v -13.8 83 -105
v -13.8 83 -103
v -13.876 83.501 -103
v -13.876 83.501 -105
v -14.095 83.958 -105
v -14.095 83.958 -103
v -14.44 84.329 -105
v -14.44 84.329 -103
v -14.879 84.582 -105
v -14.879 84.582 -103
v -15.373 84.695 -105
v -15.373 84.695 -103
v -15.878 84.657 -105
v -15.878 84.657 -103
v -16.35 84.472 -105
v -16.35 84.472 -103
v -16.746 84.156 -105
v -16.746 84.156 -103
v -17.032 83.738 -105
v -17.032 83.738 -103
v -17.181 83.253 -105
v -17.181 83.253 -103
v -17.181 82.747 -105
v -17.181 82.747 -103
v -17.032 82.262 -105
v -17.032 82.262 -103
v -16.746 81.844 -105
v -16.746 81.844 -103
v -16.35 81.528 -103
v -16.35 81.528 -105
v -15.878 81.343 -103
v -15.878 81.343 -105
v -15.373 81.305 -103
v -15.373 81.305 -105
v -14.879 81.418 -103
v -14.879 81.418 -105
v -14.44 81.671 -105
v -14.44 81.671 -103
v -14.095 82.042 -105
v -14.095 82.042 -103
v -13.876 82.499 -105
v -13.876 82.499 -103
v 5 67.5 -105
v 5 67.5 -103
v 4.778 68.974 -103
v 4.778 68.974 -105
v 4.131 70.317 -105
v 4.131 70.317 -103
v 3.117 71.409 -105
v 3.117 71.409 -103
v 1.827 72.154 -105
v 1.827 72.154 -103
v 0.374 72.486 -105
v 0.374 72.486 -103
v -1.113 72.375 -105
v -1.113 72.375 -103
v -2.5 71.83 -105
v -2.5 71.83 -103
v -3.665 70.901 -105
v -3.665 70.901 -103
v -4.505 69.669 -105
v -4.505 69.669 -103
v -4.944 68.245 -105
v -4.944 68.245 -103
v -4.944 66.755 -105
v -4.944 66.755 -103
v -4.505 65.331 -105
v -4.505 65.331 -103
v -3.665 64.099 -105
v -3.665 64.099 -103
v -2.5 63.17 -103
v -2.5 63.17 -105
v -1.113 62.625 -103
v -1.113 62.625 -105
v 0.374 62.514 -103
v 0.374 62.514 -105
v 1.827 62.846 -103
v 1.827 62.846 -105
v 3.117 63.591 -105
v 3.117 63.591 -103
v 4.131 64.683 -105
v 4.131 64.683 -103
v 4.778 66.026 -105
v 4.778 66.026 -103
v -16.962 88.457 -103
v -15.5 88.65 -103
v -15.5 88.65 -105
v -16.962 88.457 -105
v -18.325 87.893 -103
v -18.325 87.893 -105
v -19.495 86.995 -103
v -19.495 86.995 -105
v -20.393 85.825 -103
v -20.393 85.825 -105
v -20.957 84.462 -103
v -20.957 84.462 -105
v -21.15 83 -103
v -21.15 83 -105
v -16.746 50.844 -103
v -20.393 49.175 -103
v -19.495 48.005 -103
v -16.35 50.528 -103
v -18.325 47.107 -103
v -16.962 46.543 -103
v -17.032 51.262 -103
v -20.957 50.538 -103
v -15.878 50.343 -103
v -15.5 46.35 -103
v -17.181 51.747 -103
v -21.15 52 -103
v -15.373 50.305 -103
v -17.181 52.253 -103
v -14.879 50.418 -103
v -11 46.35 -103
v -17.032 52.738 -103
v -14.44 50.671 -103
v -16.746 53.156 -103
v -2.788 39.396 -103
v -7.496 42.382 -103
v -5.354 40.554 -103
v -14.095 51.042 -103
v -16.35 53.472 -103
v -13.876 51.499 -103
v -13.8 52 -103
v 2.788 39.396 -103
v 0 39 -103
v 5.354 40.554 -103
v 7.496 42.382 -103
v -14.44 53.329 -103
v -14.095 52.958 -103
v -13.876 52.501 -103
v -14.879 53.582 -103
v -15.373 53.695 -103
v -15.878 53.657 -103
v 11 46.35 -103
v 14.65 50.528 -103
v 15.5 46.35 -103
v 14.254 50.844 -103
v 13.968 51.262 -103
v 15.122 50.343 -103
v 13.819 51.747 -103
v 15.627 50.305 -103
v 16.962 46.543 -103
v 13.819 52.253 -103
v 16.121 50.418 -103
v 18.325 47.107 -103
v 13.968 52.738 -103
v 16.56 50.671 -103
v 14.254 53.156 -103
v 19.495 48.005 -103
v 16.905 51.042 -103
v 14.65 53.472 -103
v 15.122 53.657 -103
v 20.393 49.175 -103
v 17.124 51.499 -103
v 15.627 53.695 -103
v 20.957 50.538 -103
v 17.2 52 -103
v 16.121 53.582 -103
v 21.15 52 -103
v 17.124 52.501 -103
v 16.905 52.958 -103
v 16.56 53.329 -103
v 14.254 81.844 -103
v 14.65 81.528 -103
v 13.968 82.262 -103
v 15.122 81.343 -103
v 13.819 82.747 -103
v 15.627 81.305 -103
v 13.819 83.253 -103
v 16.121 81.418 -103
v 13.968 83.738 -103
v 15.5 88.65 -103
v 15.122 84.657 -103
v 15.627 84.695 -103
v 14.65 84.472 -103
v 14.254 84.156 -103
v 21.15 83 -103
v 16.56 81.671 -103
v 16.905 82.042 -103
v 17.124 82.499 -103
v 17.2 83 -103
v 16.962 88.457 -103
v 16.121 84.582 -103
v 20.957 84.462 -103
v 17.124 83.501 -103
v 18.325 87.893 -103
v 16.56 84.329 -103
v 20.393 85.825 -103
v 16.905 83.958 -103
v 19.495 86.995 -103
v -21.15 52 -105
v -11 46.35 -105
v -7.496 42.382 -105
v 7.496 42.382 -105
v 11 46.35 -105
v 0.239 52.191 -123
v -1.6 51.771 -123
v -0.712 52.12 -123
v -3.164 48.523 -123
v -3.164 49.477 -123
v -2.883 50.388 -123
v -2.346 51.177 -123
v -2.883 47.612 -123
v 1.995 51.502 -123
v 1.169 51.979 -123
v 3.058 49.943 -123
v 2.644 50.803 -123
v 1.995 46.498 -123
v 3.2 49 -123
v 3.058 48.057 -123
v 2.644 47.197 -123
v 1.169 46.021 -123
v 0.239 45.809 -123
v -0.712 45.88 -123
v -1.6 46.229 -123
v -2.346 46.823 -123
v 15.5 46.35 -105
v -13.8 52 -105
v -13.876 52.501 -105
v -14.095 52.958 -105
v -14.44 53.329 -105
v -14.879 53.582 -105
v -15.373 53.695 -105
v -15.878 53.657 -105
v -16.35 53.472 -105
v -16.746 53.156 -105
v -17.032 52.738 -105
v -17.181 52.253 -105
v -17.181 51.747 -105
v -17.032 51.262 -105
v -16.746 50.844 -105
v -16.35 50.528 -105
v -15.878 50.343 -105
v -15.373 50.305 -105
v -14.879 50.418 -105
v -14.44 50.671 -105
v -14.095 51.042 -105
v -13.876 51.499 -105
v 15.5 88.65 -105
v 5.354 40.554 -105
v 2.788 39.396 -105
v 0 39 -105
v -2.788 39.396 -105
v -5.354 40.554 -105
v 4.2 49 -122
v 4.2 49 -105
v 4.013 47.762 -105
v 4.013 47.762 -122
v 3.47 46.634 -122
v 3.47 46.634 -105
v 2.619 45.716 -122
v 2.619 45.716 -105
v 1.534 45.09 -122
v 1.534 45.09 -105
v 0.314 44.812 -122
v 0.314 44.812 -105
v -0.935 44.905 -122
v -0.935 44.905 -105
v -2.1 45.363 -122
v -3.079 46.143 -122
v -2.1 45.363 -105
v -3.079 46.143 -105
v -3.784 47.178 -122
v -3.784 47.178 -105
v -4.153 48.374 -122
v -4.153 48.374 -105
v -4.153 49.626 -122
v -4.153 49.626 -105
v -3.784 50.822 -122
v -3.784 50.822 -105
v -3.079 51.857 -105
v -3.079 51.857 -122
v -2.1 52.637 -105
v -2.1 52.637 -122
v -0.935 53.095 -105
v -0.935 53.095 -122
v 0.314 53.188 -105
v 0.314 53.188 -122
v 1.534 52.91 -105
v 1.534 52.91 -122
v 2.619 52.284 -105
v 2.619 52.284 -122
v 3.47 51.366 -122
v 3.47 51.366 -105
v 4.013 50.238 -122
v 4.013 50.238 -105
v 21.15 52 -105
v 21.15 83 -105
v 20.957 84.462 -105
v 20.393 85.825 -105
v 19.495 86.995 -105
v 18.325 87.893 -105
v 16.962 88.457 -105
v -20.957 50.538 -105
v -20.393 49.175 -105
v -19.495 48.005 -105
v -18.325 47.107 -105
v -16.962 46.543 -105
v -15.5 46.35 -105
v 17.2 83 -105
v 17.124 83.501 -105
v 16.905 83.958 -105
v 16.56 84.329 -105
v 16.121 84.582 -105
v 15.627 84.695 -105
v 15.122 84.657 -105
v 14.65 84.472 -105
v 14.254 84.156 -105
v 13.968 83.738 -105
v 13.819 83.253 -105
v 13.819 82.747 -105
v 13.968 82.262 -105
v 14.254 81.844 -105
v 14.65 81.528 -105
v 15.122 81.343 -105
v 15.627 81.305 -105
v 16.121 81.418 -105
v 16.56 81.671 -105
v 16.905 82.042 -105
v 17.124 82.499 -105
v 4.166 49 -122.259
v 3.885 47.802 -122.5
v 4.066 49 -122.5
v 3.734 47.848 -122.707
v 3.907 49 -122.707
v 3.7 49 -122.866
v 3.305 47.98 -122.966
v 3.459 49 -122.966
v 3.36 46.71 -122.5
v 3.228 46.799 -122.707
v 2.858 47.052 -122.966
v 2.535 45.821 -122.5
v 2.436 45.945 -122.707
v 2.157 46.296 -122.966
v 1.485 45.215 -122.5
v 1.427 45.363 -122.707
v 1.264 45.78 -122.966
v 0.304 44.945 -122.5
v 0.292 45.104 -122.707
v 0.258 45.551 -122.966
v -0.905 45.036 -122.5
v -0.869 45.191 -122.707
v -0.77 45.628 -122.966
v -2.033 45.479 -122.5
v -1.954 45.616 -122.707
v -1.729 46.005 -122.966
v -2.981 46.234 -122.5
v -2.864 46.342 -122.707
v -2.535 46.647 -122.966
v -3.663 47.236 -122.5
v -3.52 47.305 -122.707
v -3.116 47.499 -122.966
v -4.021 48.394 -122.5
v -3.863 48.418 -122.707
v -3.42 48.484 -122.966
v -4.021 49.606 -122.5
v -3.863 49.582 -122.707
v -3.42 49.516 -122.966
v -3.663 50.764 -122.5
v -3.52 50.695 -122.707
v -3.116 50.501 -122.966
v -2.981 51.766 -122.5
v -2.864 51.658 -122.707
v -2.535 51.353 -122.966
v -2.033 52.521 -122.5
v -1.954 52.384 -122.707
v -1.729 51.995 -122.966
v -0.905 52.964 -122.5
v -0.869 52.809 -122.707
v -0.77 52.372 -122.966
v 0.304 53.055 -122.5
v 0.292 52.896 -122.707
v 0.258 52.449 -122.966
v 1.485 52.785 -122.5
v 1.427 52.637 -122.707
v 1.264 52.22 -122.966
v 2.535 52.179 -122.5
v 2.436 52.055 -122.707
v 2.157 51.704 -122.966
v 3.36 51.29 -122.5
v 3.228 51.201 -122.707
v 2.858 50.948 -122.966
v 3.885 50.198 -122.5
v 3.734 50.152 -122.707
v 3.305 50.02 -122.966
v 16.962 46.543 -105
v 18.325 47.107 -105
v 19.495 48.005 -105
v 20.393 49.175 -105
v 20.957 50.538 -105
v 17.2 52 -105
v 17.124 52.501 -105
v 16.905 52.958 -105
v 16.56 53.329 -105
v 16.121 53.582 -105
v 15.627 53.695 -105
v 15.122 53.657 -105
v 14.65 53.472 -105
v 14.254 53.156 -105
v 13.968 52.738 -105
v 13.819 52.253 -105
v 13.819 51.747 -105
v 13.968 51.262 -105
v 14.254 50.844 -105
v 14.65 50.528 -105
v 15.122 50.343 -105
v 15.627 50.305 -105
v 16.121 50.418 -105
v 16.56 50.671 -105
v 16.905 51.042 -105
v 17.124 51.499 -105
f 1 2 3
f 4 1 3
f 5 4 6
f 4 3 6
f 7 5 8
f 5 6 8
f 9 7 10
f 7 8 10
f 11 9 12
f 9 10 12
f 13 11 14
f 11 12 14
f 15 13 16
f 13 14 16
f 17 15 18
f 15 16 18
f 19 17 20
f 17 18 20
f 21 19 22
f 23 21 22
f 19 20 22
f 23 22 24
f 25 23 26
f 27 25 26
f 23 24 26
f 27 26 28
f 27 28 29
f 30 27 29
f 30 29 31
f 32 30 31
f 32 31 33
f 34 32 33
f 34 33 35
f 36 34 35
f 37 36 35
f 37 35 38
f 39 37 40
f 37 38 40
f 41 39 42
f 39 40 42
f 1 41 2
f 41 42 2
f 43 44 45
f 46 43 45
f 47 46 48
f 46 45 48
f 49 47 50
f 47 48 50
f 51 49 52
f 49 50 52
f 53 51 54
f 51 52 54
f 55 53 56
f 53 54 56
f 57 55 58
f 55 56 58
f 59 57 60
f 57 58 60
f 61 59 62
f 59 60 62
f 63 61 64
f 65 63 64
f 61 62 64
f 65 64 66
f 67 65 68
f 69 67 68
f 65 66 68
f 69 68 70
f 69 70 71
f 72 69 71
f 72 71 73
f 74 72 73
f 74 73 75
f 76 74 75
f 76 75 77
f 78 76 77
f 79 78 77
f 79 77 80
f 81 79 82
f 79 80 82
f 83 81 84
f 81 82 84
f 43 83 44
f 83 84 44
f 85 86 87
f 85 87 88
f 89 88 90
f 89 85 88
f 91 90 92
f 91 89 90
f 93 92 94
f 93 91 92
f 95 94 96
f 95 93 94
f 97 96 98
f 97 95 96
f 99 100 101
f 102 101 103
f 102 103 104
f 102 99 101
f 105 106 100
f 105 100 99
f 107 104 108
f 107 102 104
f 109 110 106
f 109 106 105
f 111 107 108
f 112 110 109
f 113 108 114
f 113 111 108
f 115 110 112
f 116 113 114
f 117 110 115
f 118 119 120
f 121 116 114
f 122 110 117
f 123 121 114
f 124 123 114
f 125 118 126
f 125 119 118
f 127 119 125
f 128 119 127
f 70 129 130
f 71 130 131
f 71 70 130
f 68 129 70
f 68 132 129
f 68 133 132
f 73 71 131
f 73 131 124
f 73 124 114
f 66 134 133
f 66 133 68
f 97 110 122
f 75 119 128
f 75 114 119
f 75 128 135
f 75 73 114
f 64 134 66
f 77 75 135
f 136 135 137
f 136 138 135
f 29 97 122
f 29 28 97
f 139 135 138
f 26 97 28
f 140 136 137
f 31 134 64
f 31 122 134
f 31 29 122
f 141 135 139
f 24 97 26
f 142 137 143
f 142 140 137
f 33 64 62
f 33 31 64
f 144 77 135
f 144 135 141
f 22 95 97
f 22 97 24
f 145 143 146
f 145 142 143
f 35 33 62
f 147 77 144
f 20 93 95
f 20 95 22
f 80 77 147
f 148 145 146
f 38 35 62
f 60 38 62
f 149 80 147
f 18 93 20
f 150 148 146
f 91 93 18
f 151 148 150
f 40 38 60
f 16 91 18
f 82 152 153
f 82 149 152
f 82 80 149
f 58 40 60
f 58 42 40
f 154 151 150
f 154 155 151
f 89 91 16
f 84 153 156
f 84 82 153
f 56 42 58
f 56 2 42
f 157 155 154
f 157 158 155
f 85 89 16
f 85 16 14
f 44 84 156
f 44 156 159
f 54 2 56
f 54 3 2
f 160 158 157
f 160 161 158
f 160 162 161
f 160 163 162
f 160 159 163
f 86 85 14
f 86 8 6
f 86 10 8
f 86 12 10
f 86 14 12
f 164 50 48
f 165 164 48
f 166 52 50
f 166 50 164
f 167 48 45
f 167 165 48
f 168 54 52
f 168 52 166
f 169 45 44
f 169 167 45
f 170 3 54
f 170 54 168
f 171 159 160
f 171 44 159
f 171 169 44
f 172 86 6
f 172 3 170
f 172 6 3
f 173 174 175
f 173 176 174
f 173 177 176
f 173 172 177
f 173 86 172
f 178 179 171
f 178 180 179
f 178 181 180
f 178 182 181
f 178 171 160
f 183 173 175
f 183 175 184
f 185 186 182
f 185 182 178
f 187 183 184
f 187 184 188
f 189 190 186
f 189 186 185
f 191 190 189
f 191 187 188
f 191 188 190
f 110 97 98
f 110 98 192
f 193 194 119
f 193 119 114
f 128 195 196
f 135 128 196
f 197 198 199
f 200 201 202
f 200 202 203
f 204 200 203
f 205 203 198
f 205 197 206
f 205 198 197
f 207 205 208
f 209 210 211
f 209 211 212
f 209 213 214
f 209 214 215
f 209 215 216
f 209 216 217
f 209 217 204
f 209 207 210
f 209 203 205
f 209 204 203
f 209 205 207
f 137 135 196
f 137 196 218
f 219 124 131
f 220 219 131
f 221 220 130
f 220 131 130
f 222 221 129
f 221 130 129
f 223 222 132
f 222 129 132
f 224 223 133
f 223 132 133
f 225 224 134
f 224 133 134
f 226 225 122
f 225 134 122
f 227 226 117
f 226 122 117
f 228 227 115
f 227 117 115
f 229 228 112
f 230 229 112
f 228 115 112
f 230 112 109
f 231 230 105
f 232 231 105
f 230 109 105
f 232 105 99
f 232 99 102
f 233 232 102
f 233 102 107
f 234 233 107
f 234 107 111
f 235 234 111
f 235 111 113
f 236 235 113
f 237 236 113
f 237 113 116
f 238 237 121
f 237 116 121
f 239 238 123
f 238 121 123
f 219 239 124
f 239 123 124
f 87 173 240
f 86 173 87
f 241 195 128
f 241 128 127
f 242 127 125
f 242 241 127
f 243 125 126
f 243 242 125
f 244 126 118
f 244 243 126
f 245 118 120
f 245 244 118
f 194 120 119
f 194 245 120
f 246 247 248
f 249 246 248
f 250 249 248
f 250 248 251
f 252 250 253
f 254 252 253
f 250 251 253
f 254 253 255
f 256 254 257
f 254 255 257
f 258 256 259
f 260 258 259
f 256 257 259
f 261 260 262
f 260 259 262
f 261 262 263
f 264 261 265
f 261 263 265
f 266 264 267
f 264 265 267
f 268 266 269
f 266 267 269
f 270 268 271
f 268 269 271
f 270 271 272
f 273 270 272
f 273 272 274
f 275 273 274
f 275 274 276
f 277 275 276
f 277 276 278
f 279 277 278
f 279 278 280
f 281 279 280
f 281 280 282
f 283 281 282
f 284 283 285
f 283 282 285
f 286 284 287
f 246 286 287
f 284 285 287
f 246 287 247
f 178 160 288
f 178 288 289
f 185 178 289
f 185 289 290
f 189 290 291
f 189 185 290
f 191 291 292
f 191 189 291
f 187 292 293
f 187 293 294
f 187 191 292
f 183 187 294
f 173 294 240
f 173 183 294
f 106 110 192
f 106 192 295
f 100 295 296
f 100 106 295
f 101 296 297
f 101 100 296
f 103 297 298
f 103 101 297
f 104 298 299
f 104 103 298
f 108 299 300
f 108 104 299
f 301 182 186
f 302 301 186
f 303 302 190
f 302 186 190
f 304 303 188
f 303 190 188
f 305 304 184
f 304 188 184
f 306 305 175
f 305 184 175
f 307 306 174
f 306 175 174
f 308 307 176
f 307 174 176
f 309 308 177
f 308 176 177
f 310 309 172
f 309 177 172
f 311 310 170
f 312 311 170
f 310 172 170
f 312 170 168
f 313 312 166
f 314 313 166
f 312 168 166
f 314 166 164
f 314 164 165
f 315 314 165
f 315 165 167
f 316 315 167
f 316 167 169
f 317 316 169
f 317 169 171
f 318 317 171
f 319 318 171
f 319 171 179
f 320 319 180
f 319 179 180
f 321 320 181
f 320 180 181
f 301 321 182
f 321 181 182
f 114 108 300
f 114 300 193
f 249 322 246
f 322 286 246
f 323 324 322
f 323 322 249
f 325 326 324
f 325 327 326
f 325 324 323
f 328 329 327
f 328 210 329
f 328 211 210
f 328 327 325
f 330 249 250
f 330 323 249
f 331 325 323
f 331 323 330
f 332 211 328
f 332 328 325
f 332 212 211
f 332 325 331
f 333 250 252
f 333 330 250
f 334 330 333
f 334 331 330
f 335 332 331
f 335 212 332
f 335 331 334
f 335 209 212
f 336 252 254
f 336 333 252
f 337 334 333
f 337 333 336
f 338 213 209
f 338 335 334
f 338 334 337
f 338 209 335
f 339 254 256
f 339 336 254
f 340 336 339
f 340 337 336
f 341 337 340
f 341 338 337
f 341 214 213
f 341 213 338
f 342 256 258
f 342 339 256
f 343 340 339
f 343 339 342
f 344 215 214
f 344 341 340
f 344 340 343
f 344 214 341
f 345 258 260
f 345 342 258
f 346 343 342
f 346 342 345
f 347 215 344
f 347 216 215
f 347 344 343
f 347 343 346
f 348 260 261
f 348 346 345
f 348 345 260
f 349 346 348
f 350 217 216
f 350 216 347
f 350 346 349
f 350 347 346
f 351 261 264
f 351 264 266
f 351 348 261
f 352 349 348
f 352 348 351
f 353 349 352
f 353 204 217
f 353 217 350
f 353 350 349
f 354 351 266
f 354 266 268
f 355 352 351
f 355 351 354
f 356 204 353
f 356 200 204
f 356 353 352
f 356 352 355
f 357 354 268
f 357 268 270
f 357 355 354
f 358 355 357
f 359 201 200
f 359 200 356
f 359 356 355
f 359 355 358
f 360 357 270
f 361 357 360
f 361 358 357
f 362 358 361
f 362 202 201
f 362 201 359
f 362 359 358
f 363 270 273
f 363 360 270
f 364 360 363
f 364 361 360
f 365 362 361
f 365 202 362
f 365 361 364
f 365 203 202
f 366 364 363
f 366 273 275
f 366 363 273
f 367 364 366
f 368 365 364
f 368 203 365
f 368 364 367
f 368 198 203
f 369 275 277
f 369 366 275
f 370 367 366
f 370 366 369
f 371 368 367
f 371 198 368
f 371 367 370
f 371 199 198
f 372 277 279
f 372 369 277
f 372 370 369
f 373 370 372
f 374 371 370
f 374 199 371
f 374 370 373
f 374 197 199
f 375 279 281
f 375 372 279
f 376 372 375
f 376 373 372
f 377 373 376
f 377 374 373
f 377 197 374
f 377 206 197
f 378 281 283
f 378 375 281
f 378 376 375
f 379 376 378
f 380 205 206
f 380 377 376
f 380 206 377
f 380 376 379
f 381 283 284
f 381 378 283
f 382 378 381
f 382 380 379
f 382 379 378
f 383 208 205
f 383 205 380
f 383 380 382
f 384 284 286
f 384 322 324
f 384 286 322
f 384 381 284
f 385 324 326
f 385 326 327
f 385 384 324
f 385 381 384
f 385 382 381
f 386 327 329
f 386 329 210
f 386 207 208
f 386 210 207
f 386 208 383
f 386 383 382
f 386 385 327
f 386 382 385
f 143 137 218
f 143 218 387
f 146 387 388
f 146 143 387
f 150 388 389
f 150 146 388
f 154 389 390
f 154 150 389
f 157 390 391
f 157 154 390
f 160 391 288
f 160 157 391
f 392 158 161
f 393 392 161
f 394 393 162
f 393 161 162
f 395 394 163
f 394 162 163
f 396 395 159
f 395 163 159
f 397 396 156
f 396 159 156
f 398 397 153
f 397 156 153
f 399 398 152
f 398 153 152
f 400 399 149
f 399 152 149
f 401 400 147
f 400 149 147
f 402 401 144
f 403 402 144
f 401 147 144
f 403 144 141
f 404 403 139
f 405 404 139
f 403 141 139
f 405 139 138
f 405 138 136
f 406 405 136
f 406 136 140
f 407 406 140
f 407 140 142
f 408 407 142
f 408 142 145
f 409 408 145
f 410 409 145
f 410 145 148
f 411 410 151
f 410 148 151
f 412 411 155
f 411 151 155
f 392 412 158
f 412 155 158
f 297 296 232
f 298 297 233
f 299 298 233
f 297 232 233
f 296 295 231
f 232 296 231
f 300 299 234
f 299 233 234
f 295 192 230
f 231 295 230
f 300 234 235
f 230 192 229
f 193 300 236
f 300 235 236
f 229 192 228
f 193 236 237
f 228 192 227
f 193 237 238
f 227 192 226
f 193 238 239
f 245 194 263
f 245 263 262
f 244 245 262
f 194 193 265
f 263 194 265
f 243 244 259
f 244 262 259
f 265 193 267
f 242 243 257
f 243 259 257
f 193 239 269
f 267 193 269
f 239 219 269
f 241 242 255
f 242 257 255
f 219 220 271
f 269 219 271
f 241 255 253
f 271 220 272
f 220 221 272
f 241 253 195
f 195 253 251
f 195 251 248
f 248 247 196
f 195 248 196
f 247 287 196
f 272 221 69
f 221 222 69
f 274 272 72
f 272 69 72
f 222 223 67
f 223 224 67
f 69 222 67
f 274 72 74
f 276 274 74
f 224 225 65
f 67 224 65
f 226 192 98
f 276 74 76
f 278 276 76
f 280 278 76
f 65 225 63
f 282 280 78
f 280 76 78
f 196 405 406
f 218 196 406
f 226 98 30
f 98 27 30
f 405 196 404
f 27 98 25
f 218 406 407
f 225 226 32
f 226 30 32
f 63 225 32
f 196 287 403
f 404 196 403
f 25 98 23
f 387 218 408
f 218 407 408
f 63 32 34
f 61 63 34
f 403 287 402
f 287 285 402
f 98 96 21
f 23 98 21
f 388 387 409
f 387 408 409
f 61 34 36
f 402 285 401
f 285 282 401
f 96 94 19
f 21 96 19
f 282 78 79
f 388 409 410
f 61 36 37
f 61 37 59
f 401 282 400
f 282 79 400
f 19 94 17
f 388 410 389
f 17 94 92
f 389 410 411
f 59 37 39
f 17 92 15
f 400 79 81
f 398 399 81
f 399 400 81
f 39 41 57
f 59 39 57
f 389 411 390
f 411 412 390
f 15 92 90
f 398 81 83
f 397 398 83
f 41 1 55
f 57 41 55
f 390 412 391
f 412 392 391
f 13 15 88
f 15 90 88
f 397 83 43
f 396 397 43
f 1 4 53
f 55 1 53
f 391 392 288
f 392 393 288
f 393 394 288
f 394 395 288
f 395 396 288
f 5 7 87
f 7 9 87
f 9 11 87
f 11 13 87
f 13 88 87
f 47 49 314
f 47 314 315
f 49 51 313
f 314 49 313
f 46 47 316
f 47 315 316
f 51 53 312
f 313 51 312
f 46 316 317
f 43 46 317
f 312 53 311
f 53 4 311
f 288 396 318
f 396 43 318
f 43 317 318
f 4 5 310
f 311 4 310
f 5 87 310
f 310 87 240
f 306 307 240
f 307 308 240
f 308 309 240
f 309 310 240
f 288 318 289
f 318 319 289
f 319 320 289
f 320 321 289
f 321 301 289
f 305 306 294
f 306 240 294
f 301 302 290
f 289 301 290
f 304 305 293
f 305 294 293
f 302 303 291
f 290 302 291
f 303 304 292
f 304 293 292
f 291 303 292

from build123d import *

# Parameters (mm, degrees)
SKETCH114_R   = 1.7
SKETCH114_R_2 = 5
PAD058_DEPTH  = 2
PAD061_DEPTH  = 2
SKETCH119_R   = 4.2
PAD062_DEPTH  = 18
FILLET010_R   = 1


with BuildPart() as part:
    # Sketch114 → Pad058 (new body)
    with BuildSketch(Plane.XY):
        with BuildLine():
            ThreePointArc((-15.5, 21.15), (-19.495153, 19.495153), (-21.15, 15.5))
            Line((-21.15, 15.5), (-21.15, -15.5))
            ThreePointArc((-21.15, -15.5), (-19.495153, -19.495153), (-15.5, -21.15))
            Line((-15.5, -21.15), (15.5, -21.15))
            ThreePointArc((15.5, -21.15), (19.495153, -19.495153), (21.15, -15.5))
            Line((21.15, -15.5), (21.15, 15.500001))
            ThreePointArc((21.15, 15.500001), (19.495153, 19.495154), (15.5, 21.15))
            Line((15.5, 21.15), (-15.5, 21.15))
        make_face()
        with Locations((-15.5, 15.5)):
            Circle(SKETCH114_R, mode=Mode.SUBTRACT)
        with Locations((15.5, 15.5)):
            Circle(SKETCH114_R, mode=Mode.SUBTRACT)
        with Locations((15.5, -15.5)):
            Circle(SKETCH114_R, mode=Mode.SUBTRACT)
        with Locations((-15.5, -15.5)):
            Circle(SKETCH114_R, mode=Mode.SUBTRACT)
        Circle(SKETCH114_R_2, mode=Mode.SUBTRACT)
    extrude(amount=-PAD058_DEPTH)

    # Sketch118 → Pad061 (join)
    with BuildSketch(Plane(origin=(0, 0, -2), x_dir=(1, 0, 0), z_dir=(0, 0, -1))):
        with BuildLine():
            ThreePointArc((7.496486, 25.118361), (0, 28.5), (-7.496486, 25.118361))
            Line((-7.496486, 25.118361), (-11, 21.15))
            Line((11, 21.15), (-11, 21.15))
            Line((7.496486, 25.118361), (11, 21.15))
        make_face()
    extrude(amount=-PAD061_DEPTH)

    # Sketch119 (on Face18 of Pad061) → Pad062 (join)
    with BuildSketch(Plane(origin=(0, 0, -2), x_dir=(1, 0, 0), z_dir=(0, 0, -1))):
        with Locations((0, 18.5)):
            Circle(SKETCH119_R)
    extrude(amount=PAD062_DEPTH)

    # Fillet010
    fillet010_edges = [part.edges().sort_by_distance(p)[0] for p in [
        (-4.2, -18.5, -20),
    ]]
    fillet(fillet010_edges, radius=FILLET010_R)


with BuildPart() as part_1:
    # Body026 placement: moved
    add(part.part.moved(Location((0, 67.5, -103))))


solid = part_1.part
